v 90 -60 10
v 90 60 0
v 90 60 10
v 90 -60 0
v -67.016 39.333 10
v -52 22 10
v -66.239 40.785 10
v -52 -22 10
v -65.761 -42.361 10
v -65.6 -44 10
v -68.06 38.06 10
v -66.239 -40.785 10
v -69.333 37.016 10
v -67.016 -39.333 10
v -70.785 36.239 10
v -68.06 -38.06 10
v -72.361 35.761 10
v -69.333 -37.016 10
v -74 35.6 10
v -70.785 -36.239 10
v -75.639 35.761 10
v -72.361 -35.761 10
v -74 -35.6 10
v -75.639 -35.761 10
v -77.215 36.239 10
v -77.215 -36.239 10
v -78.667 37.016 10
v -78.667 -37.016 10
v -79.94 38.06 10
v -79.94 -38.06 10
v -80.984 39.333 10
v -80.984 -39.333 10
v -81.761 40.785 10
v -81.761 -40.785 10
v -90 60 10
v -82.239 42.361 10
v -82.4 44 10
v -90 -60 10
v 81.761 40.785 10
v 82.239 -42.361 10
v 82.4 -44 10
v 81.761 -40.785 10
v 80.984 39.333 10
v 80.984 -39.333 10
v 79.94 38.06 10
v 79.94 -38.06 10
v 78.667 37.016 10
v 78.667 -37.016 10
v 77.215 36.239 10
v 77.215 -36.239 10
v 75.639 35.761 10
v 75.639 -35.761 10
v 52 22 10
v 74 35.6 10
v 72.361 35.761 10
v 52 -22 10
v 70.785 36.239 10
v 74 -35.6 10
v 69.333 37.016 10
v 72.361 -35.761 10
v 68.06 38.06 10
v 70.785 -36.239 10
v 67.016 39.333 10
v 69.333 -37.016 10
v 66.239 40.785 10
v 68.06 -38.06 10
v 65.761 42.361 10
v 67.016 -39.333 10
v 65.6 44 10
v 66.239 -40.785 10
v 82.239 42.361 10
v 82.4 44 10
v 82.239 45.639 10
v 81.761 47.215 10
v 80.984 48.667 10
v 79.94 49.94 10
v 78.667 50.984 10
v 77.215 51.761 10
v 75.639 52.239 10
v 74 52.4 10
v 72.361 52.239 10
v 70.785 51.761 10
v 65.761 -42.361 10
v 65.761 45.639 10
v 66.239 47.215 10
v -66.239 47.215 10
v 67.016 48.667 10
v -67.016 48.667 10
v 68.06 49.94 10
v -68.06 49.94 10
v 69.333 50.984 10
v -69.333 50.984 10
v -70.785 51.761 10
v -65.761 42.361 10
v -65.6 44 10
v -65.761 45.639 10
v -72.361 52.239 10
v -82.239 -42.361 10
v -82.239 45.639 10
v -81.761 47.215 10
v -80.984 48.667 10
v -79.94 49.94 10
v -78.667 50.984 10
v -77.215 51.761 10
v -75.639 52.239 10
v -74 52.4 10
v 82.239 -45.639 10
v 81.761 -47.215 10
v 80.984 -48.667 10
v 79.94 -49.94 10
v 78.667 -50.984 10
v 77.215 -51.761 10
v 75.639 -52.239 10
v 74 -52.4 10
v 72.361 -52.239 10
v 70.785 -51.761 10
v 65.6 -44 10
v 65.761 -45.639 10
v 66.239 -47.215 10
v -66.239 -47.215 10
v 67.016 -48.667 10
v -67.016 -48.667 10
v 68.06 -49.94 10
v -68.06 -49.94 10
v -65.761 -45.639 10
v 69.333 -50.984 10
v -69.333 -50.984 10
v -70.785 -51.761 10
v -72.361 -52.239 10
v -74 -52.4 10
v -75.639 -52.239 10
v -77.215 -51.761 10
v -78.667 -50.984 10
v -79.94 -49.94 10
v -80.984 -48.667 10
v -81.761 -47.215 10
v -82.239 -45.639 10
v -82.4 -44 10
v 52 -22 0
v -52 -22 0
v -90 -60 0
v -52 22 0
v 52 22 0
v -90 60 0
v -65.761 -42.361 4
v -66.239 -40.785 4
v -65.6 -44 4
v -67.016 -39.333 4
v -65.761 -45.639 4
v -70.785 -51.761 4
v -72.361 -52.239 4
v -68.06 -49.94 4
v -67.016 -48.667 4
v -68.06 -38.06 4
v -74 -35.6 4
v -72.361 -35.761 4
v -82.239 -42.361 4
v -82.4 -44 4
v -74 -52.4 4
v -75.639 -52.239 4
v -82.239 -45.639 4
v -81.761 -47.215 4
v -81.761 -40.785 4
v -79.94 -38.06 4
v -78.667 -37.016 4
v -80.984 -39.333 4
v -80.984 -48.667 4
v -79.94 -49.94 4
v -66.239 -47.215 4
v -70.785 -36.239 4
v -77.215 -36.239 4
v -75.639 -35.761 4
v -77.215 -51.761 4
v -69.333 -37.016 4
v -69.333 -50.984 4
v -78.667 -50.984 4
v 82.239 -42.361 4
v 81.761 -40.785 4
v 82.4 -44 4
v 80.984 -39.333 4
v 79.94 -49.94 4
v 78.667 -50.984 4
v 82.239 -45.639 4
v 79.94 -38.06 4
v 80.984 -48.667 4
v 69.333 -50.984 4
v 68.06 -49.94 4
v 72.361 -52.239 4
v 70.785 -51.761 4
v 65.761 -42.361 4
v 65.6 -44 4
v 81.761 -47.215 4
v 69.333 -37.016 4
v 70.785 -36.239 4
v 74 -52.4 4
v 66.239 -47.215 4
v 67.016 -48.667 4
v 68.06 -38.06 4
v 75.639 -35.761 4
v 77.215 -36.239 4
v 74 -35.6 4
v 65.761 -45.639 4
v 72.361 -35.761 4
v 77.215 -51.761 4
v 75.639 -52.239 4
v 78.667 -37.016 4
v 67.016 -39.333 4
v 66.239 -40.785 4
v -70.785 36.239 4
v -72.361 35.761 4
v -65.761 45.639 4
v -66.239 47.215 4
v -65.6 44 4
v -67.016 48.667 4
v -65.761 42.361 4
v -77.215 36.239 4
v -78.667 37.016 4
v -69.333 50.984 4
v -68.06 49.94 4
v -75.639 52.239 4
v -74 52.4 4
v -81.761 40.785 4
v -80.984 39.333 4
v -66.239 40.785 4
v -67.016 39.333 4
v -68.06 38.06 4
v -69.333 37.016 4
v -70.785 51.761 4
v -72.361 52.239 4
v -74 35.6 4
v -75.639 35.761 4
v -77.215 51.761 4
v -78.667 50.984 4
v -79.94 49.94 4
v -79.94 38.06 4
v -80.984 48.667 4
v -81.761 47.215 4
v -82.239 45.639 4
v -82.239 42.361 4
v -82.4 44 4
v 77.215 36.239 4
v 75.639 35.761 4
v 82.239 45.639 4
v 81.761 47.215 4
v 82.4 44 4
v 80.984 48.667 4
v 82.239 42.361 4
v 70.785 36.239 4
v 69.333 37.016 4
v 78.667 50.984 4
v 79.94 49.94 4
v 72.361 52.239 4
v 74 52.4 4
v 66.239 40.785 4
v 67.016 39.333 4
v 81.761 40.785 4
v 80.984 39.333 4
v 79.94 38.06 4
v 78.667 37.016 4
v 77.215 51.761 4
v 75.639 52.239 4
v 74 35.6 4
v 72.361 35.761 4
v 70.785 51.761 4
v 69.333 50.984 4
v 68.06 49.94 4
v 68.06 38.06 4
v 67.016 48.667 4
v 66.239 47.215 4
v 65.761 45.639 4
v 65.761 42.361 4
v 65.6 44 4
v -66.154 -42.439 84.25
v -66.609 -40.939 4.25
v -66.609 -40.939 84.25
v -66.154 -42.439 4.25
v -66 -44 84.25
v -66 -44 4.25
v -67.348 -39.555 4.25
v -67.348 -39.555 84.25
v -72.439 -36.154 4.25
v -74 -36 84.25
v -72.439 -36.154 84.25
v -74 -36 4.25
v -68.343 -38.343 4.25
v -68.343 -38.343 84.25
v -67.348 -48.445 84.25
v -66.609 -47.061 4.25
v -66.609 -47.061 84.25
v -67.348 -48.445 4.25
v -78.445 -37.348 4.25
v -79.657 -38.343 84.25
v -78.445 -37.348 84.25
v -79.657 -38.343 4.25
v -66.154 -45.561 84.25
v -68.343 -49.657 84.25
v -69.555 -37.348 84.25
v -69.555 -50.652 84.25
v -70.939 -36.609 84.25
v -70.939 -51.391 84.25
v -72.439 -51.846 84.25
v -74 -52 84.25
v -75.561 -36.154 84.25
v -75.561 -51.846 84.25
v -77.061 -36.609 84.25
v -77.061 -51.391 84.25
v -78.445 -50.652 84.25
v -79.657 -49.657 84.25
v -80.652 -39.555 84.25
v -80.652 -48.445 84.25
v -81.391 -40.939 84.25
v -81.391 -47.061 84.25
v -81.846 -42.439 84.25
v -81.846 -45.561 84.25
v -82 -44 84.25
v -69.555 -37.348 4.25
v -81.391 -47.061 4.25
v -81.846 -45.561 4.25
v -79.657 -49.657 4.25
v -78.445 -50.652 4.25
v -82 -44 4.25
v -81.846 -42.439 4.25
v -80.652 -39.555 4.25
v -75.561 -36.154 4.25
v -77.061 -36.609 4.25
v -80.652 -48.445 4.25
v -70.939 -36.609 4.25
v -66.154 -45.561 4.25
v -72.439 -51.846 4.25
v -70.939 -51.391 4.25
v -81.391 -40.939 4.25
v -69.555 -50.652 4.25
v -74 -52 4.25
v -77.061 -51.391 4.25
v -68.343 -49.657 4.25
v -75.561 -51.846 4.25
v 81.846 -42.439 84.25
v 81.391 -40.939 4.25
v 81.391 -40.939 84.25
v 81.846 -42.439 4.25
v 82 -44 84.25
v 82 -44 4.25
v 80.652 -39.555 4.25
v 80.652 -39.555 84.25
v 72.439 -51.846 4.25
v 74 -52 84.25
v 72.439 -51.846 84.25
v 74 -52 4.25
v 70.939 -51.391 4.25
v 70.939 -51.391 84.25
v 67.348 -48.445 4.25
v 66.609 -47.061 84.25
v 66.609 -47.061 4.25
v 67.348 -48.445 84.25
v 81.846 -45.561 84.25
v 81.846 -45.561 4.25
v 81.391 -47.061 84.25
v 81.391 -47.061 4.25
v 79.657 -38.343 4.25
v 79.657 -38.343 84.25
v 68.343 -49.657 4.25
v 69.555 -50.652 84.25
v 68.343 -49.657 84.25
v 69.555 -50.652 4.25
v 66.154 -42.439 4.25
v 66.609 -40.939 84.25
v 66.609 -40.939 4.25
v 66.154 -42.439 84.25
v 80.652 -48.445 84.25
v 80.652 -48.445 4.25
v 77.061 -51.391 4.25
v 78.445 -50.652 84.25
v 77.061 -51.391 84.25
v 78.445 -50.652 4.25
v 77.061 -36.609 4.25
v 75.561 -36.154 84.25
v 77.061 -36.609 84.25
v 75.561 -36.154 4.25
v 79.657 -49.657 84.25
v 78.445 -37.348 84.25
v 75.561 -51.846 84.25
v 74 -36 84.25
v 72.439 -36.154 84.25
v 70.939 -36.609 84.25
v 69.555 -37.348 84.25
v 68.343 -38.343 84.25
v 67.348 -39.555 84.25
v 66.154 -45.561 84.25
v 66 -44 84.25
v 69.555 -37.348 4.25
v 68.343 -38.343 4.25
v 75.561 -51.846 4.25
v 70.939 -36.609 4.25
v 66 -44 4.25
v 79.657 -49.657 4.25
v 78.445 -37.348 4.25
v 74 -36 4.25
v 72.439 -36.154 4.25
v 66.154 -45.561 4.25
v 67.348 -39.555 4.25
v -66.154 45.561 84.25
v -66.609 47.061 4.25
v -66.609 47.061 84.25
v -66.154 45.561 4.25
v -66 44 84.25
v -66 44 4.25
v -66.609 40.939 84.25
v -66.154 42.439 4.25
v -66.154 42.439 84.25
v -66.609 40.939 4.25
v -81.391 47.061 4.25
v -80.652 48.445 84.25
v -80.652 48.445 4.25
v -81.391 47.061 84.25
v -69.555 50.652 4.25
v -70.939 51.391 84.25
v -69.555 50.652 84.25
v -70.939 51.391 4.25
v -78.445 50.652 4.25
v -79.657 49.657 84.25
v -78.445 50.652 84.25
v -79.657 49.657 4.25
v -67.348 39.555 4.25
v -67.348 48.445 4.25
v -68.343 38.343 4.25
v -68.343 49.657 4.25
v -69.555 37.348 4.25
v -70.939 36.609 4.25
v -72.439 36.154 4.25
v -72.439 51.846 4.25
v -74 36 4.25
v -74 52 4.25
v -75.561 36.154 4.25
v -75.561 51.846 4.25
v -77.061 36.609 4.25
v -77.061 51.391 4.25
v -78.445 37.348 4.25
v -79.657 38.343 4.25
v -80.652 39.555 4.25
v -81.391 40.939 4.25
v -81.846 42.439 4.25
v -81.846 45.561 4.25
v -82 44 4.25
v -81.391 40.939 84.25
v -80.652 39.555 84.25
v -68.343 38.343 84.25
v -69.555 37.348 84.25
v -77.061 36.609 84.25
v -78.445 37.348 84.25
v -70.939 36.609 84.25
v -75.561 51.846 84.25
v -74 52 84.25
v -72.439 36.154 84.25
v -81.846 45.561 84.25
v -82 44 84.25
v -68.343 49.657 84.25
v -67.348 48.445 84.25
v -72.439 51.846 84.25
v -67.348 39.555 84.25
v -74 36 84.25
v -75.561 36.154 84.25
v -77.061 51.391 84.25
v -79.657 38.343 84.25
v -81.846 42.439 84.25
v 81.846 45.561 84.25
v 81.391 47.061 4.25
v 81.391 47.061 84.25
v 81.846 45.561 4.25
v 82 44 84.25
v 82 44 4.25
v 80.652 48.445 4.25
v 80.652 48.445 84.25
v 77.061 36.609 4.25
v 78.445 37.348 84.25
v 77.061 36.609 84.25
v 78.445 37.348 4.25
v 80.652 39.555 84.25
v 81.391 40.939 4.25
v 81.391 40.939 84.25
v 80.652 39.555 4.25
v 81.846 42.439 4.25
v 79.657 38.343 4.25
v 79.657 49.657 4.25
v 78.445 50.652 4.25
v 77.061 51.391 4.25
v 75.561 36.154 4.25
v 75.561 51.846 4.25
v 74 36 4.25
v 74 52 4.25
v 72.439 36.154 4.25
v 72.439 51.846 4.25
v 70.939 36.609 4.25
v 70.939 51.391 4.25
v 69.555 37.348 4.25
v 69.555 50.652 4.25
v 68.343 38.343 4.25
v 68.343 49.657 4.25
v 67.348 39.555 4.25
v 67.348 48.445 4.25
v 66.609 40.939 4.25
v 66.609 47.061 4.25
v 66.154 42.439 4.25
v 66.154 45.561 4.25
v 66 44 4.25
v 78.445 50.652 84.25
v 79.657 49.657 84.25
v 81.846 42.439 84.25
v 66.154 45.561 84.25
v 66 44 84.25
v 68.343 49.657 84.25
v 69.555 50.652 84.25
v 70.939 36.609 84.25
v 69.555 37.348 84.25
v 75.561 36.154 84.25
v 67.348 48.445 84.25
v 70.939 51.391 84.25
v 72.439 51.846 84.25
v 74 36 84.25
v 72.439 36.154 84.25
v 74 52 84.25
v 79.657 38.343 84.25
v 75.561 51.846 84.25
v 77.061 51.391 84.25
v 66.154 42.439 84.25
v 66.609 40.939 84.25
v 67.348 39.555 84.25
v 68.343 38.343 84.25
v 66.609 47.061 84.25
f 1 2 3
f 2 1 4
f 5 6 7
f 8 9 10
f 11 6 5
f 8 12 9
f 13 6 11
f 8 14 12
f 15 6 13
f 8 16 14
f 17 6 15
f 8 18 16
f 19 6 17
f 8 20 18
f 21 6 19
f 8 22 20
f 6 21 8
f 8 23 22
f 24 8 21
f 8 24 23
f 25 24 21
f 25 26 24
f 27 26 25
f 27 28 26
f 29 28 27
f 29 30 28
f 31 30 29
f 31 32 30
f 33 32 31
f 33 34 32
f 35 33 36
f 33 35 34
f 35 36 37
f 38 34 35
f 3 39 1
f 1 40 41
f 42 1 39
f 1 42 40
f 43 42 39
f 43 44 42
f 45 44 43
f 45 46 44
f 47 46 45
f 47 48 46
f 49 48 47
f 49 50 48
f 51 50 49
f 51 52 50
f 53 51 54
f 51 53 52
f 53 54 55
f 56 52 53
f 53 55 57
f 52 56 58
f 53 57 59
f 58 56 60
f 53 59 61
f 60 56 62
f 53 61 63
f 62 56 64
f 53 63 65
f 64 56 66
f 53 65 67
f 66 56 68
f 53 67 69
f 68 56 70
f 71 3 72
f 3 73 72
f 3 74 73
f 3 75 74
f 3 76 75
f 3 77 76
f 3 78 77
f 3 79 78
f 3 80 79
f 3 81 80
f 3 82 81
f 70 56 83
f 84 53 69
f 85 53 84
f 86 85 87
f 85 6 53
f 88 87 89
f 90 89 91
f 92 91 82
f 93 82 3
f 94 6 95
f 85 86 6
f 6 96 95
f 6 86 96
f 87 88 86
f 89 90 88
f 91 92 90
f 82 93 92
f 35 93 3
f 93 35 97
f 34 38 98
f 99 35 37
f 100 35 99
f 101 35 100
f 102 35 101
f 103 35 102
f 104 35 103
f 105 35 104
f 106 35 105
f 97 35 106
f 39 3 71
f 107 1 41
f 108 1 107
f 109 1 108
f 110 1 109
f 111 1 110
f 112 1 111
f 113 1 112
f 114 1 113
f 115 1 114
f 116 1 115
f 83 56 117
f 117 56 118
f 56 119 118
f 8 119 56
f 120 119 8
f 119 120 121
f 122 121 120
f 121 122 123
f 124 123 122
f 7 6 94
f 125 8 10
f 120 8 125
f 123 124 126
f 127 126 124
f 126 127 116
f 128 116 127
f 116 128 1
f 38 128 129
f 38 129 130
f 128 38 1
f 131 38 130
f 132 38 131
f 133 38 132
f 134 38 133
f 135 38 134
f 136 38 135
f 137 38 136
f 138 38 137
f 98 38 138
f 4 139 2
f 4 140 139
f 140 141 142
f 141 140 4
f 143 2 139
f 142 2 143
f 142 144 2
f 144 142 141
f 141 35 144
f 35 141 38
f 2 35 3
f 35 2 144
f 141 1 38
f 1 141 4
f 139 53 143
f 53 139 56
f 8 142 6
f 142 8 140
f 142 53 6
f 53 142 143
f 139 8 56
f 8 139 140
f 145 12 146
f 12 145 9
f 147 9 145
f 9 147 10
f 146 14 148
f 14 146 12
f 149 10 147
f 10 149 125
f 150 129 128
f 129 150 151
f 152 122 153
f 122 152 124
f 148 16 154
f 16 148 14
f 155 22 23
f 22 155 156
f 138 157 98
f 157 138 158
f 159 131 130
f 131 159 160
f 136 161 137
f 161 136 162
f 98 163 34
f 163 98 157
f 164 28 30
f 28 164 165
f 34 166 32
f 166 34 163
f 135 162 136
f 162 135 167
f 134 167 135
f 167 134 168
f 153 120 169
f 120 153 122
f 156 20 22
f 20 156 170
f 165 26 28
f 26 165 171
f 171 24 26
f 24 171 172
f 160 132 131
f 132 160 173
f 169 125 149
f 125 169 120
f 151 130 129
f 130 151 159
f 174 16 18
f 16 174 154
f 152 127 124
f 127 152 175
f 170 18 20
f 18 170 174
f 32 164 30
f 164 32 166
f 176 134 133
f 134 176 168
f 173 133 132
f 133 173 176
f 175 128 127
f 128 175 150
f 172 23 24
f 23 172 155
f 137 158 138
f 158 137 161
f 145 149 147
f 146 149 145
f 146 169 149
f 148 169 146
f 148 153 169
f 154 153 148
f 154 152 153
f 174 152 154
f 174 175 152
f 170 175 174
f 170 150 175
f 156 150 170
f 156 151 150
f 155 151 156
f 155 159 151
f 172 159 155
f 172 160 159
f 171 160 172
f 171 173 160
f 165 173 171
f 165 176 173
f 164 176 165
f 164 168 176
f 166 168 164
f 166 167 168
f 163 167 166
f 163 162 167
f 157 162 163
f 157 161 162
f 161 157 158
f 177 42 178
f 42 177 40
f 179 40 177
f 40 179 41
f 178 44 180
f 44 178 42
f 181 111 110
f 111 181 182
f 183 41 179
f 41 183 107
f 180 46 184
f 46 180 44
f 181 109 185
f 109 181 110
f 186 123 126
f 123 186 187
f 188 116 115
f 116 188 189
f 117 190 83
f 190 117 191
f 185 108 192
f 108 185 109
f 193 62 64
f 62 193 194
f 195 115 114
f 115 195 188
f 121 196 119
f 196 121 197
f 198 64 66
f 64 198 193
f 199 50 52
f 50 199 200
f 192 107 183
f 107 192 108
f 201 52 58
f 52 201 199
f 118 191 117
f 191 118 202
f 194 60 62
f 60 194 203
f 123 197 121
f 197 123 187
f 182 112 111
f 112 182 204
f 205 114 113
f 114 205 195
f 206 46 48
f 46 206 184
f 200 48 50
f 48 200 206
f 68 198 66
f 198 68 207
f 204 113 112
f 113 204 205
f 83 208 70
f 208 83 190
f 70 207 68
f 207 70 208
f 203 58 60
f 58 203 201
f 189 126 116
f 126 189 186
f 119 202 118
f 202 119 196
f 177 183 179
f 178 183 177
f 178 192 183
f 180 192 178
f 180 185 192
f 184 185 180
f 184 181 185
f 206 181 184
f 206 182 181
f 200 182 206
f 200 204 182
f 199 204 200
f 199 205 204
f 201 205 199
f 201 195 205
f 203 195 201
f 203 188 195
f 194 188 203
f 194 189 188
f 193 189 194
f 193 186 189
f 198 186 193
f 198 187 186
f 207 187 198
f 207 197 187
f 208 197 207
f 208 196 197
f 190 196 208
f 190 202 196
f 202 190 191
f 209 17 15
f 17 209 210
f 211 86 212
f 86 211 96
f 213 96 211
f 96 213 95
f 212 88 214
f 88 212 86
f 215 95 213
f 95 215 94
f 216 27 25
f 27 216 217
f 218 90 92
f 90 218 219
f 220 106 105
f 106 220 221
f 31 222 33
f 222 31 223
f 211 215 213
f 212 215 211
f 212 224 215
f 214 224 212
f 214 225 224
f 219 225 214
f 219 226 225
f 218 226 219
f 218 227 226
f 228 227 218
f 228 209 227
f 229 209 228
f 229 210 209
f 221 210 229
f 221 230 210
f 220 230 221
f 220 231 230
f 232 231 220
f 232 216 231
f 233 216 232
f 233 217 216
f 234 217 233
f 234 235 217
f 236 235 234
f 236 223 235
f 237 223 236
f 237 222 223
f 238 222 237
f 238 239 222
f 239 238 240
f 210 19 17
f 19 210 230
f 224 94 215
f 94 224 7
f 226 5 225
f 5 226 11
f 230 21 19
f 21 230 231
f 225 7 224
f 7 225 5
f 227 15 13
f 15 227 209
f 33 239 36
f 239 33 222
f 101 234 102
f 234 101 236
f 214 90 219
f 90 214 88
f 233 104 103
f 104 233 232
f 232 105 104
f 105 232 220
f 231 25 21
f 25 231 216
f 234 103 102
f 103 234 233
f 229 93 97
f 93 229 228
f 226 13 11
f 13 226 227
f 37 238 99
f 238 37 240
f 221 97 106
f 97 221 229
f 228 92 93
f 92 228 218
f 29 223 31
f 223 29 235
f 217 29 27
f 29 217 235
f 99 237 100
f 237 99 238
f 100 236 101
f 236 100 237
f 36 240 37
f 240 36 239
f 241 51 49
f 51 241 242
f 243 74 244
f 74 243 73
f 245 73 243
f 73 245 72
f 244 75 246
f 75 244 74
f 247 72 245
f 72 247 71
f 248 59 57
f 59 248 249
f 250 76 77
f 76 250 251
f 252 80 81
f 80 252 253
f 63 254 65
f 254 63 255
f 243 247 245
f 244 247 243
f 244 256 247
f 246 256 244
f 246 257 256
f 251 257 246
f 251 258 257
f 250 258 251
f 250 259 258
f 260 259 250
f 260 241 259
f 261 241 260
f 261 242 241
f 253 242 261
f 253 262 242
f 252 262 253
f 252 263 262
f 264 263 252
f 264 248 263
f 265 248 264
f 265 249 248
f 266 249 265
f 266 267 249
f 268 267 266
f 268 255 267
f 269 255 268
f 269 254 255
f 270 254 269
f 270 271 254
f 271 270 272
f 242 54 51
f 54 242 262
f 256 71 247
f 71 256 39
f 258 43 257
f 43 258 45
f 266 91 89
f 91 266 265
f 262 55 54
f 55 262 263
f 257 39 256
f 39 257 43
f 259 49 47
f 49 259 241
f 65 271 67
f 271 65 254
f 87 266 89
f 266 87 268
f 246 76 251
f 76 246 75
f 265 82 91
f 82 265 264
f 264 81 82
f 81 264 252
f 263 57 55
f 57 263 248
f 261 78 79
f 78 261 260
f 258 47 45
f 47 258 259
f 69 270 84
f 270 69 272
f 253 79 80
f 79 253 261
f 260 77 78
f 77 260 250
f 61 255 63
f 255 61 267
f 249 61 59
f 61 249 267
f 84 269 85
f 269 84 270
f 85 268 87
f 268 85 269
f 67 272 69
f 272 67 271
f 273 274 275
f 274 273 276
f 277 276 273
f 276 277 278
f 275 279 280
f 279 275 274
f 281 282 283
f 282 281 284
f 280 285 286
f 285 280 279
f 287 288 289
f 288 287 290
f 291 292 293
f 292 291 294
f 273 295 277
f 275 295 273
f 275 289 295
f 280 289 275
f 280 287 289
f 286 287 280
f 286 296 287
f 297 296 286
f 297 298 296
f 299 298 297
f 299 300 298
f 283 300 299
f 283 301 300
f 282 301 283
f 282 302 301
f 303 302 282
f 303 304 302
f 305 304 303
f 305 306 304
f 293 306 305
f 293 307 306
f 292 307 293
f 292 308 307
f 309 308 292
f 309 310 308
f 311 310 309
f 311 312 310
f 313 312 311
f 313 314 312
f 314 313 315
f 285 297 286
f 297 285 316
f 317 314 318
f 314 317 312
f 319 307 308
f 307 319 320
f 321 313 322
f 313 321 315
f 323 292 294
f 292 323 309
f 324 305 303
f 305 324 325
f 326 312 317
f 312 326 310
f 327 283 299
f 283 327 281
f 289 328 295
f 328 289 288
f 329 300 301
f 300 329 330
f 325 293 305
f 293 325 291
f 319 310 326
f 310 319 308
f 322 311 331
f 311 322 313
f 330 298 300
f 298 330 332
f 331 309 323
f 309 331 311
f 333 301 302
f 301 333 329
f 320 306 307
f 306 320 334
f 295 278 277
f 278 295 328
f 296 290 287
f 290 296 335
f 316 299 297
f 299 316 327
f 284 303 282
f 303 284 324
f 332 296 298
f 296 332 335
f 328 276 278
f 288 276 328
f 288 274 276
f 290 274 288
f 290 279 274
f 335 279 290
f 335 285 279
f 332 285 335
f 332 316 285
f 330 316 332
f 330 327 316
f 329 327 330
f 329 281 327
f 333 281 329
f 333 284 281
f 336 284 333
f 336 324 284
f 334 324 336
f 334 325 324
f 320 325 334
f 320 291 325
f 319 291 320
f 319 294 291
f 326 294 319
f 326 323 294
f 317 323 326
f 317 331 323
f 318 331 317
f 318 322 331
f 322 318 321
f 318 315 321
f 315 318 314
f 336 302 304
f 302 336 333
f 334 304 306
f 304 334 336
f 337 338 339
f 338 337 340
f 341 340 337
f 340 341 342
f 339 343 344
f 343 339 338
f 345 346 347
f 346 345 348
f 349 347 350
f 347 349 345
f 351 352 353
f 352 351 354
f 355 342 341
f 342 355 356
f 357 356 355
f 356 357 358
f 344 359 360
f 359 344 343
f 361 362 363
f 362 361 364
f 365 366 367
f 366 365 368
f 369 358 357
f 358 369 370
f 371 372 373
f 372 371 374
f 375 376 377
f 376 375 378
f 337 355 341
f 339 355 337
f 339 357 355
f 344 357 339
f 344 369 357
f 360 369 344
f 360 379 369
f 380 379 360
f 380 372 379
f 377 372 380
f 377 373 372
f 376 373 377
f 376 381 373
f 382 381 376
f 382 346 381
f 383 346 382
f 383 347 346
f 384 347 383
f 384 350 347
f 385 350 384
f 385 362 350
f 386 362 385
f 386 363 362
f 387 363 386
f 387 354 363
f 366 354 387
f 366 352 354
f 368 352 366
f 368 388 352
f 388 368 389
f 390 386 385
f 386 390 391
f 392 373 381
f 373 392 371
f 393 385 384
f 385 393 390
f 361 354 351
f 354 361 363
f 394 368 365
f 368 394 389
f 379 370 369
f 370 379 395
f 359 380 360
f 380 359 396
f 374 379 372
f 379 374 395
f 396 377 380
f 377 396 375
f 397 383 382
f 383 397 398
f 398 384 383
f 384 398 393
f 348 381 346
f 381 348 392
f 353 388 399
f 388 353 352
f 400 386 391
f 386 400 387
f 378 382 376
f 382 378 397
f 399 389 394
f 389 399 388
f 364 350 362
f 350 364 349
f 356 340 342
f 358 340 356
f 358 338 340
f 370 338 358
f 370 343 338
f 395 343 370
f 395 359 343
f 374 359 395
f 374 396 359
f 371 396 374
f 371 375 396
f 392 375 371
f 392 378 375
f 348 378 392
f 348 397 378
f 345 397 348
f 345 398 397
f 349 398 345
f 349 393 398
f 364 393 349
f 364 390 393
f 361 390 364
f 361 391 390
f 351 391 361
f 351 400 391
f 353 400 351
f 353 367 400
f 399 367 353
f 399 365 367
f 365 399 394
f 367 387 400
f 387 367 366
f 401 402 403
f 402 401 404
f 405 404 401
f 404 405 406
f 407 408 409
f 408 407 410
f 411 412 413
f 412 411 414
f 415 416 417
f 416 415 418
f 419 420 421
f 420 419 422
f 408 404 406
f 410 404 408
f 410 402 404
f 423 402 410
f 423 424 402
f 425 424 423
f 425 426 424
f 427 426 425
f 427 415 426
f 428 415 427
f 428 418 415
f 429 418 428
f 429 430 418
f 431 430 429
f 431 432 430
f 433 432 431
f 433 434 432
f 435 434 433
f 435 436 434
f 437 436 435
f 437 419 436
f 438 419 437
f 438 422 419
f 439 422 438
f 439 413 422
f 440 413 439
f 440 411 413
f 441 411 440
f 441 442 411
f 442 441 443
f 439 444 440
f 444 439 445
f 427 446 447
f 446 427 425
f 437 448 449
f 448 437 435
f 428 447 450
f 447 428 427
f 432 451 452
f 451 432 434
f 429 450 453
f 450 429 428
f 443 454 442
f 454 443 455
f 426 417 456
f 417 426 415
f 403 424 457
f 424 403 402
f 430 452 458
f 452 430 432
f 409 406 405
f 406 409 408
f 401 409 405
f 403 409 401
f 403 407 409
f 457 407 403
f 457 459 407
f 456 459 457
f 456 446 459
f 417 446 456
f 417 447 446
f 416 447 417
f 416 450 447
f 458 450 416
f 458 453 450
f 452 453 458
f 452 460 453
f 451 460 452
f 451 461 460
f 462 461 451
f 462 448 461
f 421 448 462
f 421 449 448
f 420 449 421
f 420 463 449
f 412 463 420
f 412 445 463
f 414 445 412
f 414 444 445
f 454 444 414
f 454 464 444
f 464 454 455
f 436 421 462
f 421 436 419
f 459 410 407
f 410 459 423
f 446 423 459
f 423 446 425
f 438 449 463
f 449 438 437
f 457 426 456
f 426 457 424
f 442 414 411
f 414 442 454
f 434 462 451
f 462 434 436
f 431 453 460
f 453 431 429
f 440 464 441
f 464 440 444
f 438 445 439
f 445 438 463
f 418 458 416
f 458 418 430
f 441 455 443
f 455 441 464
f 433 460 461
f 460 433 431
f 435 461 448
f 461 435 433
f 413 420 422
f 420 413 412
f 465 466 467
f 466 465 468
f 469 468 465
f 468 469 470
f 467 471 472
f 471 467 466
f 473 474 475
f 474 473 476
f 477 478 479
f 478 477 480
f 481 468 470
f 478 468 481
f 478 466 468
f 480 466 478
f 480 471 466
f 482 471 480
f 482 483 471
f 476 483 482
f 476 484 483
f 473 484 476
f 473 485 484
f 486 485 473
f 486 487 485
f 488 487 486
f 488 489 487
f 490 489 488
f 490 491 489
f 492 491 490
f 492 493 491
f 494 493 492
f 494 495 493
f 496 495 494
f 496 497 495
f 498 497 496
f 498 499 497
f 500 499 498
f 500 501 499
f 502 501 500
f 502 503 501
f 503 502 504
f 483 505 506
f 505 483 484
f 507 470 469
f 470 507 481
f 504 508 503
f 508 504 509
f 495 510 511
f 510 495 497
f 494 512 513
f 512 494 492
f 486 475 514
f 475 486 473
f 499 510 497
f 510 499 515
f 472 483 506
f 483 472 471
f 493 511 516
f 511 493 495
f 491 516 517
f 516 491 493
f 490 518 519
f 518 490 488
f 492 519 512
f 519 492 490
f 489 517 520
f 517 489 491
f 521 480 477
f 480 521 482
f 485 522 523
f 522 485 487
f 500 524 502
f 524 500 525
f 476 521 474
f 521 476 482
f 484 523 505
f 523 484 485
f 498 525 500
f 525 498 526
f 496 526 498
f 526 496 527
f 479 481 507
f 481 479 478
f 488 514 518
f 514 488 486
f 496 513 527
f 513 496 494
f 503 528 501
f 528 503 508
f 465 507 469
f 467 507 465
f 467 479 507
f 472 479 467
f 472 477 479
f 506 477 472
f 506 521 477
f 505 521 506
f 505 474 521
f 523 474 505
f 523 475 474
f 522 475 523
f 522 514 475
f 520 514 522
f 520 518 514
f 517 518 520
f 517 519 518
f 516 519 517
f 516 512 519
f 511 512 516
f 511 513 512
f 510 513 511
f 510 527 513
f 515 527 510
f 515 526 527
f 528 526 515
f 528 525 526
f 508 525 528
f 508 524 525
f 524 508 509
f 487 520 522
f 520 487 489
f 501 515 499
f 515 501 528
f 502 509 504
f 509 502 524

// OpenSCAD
$fn = 32;

// ------------------------------------------------------------------------
// Frame with four posts: 180 x 120 mm frame, four d16 posts
// Every part is its own module, assembly() places them once.
// ------------------------------------------------------------------------

// --- part 1 ---
module base_frame() {
  difference() {
    translate([-90, -60, 0]) cube([180, 120, 10]);
    translate([-52, -22, -1]) cube([104, 44, 12]);
    translate([-74, -44, 4]) cylinder(h = 7, d = 16.8);
    translate([74, -44, 4]) cylinder(h = 7, d = 16.8);
    translate([-74, 44, 4]) cylinder(h = 7, d = 16.8);
    translate([74, 44, 4]) cylinder(h = 7, d = 16.8);
  }
}

// --- part 2 ---
module post1() {
  cylinder(h = 80, d = 16);
}

// --- part 3 ---
module post2() {
  cylinder(h = 80, d = 16);
}

// --- part 4 ---
module post3() {
  cylinder(h = 80, d = 16);
}

// --- part 5 ---
module post4() {
  cylinder(h = 80, d = 16);
}

// --- assembly ---
module assembly() {
  translate([0, 0, 0]) rotate([0, 0, 0]) base_frame();
  translate([-74, -44, 4.25]) rotate([0, 0, 0]) post1();
  translate([74, -44, 4.25]) rotate([0, 0, 0]) post2();
  translate([-74, 44, 4.25]) rotate([0, 0, 0]) post3();
  translate([74, 44, 4.25]) rotate([0, 0, 0]) post4();
}

assembly();
